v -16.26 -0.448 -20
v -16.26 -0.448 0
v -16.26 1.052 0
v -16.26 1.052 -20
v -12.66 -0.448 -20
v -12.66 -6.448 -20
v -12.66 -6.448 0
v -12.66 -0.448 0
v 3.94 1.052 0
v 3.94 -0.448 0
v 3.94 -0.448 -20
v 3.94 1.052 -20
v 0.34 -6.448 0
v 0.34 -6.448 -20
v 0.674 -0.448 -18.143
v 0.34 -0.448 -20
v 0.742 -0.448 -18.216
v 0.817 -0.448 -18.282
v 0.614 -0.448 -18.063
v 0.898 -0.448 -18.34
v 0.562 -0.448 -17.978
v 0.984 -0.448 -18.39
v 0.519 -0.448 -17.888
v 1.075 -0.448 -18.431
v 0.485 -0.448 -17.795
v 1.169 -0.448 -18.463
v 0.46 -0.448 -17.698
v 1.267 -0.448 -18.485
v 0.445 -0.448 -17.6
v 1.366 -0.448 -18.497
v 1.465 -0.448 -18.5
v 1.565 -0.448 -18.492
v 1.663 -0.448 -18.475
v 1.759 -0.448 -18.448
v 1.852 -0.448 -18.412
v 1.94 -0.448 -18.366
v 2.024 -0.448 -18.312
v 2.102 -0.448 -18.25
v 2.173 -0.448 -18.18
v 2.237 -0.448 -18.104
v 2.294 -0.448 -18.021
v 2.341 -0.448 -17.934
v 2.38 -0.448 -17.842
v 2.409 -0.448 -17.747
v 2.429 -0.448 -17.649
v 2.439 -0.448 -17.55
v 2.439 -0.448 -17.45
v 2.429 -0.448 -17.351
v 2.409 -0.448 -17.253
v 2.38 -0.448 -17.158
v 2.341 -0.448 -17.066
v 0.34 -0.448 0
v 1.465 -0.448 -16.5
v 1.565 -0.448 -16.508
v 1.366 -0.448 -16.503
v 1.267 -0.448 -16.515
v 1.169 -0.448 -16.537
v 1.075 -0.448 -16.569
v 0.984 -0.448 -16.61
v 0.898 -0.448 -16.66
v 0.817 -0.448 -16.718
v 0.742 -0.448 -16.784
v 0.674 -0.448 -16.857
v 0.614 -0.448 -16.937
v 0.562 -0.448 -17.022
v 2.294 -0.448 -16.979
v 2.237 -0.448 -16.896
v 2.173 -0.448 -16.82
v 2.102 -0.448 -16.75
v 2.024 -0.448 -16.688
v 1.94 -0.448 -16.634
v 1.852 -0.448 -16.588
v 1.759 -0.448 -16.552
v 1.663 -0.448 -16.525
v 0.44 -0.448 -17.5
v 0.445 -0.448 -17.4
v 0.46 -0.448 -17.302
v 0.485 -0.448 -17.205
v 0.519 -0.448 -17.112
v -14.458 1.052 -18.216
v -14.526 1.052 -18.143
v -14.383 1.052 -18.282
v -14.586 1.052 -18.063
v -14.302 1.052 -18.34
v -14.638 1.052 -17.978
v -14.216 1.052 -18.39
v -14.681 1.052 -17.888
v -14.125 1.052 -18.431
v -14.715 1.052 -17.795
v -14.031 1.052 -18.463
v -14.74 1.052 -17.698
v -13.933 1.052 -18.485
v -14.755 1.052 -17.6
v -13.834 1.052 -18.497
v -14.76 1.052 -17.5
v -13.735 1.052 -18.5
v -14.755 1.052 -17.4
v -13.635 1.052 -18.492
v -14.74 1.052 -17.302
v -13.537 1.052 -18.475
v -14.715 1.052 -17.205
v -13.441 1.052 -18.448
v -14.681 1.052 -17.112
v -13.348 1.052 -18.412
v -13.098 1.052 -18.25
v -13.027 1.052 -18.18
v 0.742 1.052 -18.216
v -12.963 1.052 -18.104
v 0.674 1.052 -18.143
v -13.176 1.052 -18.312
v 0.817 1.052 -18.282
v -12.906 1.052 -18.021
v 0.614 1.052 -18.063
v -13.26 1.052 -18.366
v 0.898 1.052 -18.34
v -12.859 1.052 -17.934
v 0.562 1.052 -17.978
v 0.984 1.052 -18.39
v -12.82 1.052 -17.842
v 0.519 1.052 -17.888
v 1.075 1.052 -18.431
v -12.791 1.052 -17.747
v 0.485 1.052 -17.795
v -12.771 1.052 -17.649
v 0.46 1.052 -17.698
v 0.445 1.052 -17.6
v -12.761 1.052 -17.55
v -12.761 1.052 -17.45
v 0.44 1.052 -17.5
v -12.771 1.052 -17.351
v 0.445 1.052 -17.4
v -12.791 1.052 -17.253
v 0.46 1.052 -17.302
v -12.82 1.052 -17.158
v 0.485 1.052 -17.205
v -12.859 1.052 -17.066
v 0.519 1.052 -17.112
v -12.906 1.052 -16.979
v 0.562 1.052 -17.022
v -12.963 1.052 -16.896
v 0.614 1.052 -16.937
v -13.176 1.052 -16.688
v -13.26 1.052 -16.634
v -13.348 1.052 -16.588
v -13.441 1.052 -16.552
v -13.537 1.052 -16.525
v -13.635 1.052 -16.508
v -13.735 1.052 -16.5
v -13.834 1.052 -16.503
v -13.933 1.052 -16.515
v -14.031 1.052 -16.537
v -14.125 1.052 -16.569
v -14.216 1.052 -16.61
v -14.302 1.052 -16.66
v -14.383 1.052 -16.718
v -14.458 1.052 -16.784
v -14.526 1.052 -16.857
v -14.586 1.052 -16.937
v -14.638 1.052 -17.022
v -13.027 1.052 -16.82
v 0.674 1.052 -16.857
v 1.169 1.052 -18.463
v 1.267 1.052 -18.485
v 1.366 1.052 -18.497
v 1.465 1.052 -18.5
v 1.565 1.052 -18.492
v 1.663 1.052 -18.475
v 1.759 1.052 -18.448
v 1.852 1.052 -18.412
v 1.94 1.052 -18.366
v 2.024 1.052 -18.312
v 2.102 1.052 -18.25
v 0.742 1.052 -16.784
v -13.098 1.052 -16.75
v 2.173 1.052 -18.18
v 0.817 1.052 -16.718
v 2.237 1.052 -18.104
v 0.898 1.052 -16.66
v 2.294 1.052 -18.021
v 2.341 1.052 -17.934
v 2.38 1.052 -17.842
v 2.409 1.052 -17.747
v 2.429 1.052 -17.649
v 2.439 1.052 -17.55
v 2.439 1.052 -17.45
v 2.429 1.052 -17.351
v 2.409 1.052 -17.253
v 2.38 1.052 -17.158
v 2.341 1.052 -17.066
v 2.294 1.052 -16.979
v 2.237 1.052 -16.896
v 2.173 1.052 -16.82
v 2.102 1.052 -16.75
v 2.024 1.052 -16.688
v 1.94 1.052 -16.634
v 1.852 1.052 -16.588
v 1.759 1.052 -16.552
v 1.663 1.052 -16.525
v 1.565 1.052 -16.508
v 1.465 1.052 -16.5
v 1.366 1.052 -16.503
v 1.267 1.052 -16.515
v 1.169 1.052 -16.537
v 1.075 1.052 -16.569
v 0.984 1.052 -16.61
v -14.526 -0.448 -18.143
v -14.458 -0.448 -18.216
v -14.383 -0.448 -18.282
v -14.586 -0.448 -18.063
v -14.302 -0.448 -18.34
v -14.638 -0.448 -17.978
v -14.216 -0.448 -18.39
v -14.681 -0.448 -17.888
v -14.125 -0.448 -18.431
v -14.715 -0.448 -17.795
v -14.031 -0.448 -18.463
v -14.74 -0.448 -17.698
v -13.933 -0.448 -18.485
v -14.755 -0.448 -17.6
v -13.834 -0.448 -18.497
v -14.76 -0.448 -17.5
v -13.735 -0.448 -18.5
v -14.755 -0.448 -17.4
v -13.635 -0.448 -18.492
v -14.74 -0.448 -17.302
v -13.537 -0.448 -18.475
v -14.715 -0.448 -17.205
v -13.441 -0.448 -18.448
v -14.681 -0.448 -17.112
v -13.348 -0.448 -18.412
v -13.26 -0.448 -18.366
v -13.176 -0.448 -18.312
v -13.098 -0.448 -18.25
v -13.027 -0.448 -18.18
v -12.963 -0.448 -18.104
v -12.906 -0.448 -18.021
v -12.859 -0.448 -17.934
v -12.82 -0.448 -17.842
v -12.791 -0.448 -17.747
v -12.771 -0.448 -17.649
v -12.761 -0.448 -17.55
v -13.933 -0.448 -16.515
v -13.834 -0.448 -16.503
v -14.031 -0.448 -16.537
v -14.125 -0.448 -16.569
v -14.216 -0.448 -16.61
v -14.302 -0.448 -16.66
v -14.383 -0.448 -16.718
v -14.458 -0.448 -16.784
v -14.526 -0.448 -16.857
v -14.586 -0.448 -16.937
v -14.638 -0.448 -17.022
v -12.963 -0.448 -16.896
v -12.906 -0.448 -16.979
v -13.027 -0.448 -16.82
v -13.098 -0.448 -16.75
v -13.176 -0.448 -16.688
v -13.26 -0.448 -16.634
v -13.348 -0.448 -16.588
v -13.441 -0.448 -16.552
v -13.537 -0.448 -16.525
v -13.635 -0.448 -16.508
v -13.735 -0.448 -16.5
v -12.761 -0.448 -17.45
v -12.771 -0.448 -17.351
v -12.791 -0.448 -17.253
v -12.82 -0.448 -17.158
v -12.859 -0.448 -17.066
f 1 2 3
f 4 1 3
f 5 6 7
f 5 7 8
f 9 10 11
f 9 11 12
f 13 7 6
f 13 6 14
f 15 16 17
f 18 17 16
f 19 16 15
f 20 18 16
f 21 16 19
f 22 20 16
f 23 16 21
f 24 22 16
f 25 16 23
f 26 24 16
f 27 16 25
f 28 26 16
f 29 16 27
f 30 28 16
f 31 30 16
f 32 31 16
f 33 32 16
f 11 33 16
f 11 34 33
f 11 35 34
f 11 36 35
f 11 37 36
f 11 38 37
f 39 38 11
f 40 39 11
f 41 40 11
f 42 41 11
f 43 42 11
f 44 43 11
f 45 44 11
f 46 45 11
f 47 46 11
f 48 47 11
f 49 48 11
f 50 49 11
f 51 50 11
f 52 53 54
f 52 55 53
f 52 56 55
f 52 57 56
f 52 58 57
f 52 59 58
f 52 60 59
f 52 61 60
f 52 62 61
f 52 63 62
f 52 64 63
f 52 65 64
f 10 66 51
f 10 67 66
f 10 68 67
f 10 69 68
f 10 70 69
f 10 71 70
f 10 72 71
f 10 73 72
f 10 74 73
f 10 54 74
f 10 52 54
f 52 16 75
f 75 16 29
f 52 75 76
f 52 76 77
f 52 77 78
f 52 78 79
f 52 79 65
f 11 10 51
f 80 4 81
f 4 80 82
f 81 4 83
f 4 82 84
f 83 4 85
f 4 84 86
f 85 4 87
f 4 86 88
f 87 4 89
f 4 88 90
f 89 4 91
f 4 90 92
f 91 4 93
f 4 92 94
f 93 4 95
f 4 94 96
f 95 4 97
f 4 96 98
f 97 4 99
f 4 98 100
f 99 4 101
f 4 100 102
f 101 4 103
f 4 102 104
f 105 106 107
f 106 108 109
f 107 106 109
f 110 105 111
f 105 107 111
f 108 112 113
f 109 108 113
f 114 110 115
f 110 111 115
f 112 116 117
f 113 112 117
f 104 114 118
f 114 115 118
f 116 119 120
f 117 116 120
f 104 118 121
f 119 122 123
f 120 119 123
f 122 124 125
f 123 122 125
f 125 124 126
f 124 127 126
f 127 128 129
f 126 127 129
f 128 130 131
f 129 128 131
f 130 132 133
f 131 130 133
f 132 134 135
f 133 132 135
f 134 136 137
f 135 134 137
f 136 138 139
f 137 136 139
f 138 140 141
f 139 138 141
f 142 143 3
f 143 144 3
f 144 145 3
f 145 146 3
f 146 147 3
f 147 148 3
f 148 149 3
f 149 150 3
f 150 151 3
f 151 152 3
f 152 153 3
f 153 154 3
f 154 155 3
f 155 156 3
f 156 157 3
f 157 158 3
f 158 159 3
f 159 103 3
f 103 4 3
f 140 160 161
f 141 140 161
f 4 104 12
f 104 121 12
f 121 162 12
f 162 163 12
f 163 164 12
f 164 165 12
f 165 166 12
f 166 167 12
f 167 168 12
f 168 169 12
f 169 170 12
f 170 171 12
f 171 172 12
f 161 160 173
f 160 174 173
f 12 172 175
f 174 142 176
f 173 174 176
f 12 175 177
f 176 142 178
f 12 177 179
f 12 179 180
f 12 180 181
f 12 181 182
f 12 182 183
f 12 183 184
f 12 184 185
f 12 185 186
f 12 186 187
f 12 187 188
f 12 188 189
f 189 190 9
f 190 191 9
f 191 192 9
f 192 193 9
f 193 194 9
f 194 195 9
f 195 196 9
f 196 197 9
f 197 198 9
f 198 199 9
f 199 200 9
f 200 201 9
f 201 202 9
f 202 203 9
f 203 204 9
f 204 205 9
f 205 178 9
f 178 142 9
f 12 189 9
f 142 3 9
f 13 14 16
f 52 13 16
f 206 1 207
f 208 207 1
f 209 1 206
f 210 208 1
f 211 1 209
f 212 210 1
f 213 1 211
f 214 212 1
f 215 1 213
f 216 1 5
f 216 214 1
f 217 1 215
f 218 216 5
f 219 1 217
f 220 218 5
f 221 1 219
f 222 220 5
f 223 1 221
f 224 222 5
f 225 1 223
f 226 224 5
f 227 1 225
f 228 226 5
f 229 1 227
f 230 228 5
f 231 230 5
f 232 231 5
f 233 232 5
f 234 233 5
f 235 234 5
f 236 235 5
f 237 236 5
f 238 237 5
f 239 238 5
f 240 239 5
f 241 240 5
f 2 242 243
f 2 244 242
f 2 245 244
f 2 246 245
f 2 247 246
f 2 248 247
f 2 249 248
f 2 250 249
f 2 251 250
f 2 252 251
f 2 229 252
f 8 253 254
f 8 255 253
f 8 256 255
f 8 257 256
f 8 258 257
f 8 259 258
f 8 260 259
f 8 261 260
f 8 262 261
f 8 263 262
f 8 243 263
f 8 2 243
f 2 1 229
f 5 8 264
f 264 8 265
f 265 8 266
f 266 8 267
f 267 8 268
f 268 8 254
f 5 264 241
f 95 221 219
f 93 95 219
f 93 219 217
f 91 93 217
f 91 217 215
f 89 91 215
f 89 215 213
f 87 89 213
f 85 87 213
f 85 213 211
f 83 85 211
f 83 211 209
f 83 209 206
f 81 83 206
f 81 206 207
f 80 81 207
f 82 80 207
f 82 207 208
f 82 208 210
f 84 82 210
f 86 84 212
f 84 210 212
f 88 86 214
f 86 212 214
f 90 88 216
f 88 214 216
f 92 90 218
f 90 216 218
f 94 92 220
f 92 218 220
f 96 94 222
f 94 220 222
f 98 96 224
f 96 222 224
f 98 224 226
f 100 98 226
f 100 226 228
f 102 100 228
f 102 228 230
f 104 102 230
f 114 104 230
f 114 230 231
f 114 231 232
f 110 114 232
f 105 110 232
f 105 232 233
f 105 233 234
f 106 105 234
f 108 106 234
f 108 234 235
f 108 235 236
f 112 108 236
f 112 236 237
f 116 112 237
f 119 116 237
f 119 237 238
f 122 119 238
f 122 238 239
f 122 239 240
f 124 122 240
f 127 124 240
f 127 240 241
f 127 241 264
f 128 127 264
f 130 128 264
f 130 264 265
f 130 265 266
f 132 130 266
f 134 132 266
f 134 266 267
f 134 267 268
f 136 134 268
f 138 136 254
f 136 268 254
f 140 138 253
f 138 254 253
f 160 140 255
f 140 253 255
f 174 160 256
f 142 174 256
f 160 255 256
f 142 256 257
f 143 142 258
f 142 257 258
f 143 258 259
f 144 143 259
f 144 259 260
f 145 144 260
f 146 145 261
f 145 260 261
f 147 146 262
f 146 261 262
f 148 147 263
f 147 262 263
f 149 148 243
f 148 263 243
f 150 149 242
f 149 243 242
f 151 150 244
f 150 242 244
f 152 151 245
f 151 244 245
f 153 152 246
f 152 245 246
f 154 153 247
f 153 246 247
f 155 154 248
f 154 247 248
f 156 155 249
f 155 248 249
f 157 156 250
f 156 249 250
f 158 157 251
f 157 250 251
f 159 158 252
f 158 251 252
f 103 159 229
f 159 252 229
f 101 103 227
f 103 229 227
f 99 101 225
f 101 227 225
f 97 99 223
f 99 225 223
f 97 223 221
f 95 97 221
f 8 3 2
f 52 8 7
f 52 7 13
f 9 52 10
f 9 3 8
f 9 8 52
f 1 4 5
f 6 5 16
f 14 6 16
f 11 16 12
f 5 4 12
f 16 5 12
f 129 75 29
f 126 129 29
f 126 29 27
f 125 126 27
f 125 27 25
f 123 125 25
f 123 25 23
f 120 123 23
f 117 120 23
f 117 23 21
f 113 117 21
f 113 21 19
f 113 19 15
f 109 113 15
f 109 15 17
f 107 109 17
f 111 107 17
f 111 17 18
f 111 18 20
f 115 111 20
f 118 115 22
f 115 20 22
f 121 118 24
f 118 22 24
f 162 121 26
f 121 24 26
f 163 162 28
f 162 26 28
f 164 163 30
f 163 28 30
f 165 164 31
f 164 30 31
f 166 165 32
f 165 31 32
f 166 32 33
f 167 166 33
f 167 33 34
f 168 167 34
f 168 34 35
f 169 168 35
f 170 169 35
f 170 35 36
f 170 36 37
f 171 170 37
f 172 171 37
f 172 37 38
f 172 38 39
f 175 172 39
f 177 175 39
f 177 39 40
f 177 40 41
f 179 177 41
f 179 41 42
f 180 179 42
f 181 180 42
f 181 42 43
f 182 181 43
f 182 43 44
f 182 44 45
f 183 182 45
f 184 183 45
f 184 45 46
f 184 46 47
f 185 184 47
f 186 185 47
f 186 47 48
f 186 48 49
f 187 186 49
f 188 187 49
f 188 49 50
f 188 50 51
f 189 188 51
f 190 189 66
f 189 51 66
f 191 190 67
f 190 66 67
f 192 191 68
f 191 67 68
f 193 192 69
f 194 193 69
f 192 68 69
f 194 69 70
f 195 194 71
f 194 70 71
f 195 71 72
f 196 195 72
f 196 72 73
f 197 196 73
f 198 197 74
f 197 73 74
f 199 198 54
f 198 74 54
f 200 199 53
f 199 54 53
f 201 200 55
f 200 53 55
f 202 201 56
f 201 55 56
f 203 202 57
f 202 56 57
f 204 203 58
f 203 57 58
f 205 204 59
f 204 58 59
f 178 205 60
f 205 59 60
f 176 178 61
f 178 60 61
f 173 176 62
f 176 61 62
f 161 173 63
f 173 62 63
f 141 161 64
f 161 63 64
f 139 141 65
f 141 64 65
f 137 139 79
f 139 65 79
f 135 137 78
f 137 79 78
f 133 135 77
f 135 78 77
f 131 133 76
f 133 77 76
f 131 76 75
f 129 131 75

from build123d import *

# Parameters (mm, degrees)
SKETCH_1_W          = 20.2
SKETCH_1_H          = 1.5
EXTRUDE_1_DEPTH     = 20
SKETCH_2_W          = 13
SKETCH_2_H          = 6
EXTRUDE_2_DEPTH     = 20
SKETCH_3_R          = 1
CUT_EXTRUDE_1_DEPTH = 2.5


with BuildPart() as part:
    # 草图1 → 凸台-拉伸1 (new body)
    with BuildSketch(Plane.XY):
        with Locations((-6.159701493, 0.302238806)):
            Rectangle(SKETCH_1_W, SKETCH_1_H)
    extrude(amount=-EXTRUDE_1_DEPTH)

    # 草图2 → 凸台-拉伸2 (add)
    with BuildSketch(Plane.XY):
        with Locations((-6.159701493, -3.447761194)):
            Rectangle(SKETCH_2_W, SKETCH_2_H)
    extrude(amount=-EXTRUDE_2_DEPTH)

    # 草图3 → 切除-拉伸1 (cut, through all)
    with BuildSketch(Plane(origin=(0, -0.447761194, 0), x_dir=(-1, 0, 0), z_dir=(0, -1, 0))):
        with Locations((-1.440298507, 17.5)):
            Circle(SKETCH_3_R)
        with Locations((13.759701493, 17.5)):
            Circle(SKETCH_3_R)
    extrude(amount=-CUT_EXTRUDE_1_DEPTH, mode=Mode.SUBTRACT)


solid = part.part
